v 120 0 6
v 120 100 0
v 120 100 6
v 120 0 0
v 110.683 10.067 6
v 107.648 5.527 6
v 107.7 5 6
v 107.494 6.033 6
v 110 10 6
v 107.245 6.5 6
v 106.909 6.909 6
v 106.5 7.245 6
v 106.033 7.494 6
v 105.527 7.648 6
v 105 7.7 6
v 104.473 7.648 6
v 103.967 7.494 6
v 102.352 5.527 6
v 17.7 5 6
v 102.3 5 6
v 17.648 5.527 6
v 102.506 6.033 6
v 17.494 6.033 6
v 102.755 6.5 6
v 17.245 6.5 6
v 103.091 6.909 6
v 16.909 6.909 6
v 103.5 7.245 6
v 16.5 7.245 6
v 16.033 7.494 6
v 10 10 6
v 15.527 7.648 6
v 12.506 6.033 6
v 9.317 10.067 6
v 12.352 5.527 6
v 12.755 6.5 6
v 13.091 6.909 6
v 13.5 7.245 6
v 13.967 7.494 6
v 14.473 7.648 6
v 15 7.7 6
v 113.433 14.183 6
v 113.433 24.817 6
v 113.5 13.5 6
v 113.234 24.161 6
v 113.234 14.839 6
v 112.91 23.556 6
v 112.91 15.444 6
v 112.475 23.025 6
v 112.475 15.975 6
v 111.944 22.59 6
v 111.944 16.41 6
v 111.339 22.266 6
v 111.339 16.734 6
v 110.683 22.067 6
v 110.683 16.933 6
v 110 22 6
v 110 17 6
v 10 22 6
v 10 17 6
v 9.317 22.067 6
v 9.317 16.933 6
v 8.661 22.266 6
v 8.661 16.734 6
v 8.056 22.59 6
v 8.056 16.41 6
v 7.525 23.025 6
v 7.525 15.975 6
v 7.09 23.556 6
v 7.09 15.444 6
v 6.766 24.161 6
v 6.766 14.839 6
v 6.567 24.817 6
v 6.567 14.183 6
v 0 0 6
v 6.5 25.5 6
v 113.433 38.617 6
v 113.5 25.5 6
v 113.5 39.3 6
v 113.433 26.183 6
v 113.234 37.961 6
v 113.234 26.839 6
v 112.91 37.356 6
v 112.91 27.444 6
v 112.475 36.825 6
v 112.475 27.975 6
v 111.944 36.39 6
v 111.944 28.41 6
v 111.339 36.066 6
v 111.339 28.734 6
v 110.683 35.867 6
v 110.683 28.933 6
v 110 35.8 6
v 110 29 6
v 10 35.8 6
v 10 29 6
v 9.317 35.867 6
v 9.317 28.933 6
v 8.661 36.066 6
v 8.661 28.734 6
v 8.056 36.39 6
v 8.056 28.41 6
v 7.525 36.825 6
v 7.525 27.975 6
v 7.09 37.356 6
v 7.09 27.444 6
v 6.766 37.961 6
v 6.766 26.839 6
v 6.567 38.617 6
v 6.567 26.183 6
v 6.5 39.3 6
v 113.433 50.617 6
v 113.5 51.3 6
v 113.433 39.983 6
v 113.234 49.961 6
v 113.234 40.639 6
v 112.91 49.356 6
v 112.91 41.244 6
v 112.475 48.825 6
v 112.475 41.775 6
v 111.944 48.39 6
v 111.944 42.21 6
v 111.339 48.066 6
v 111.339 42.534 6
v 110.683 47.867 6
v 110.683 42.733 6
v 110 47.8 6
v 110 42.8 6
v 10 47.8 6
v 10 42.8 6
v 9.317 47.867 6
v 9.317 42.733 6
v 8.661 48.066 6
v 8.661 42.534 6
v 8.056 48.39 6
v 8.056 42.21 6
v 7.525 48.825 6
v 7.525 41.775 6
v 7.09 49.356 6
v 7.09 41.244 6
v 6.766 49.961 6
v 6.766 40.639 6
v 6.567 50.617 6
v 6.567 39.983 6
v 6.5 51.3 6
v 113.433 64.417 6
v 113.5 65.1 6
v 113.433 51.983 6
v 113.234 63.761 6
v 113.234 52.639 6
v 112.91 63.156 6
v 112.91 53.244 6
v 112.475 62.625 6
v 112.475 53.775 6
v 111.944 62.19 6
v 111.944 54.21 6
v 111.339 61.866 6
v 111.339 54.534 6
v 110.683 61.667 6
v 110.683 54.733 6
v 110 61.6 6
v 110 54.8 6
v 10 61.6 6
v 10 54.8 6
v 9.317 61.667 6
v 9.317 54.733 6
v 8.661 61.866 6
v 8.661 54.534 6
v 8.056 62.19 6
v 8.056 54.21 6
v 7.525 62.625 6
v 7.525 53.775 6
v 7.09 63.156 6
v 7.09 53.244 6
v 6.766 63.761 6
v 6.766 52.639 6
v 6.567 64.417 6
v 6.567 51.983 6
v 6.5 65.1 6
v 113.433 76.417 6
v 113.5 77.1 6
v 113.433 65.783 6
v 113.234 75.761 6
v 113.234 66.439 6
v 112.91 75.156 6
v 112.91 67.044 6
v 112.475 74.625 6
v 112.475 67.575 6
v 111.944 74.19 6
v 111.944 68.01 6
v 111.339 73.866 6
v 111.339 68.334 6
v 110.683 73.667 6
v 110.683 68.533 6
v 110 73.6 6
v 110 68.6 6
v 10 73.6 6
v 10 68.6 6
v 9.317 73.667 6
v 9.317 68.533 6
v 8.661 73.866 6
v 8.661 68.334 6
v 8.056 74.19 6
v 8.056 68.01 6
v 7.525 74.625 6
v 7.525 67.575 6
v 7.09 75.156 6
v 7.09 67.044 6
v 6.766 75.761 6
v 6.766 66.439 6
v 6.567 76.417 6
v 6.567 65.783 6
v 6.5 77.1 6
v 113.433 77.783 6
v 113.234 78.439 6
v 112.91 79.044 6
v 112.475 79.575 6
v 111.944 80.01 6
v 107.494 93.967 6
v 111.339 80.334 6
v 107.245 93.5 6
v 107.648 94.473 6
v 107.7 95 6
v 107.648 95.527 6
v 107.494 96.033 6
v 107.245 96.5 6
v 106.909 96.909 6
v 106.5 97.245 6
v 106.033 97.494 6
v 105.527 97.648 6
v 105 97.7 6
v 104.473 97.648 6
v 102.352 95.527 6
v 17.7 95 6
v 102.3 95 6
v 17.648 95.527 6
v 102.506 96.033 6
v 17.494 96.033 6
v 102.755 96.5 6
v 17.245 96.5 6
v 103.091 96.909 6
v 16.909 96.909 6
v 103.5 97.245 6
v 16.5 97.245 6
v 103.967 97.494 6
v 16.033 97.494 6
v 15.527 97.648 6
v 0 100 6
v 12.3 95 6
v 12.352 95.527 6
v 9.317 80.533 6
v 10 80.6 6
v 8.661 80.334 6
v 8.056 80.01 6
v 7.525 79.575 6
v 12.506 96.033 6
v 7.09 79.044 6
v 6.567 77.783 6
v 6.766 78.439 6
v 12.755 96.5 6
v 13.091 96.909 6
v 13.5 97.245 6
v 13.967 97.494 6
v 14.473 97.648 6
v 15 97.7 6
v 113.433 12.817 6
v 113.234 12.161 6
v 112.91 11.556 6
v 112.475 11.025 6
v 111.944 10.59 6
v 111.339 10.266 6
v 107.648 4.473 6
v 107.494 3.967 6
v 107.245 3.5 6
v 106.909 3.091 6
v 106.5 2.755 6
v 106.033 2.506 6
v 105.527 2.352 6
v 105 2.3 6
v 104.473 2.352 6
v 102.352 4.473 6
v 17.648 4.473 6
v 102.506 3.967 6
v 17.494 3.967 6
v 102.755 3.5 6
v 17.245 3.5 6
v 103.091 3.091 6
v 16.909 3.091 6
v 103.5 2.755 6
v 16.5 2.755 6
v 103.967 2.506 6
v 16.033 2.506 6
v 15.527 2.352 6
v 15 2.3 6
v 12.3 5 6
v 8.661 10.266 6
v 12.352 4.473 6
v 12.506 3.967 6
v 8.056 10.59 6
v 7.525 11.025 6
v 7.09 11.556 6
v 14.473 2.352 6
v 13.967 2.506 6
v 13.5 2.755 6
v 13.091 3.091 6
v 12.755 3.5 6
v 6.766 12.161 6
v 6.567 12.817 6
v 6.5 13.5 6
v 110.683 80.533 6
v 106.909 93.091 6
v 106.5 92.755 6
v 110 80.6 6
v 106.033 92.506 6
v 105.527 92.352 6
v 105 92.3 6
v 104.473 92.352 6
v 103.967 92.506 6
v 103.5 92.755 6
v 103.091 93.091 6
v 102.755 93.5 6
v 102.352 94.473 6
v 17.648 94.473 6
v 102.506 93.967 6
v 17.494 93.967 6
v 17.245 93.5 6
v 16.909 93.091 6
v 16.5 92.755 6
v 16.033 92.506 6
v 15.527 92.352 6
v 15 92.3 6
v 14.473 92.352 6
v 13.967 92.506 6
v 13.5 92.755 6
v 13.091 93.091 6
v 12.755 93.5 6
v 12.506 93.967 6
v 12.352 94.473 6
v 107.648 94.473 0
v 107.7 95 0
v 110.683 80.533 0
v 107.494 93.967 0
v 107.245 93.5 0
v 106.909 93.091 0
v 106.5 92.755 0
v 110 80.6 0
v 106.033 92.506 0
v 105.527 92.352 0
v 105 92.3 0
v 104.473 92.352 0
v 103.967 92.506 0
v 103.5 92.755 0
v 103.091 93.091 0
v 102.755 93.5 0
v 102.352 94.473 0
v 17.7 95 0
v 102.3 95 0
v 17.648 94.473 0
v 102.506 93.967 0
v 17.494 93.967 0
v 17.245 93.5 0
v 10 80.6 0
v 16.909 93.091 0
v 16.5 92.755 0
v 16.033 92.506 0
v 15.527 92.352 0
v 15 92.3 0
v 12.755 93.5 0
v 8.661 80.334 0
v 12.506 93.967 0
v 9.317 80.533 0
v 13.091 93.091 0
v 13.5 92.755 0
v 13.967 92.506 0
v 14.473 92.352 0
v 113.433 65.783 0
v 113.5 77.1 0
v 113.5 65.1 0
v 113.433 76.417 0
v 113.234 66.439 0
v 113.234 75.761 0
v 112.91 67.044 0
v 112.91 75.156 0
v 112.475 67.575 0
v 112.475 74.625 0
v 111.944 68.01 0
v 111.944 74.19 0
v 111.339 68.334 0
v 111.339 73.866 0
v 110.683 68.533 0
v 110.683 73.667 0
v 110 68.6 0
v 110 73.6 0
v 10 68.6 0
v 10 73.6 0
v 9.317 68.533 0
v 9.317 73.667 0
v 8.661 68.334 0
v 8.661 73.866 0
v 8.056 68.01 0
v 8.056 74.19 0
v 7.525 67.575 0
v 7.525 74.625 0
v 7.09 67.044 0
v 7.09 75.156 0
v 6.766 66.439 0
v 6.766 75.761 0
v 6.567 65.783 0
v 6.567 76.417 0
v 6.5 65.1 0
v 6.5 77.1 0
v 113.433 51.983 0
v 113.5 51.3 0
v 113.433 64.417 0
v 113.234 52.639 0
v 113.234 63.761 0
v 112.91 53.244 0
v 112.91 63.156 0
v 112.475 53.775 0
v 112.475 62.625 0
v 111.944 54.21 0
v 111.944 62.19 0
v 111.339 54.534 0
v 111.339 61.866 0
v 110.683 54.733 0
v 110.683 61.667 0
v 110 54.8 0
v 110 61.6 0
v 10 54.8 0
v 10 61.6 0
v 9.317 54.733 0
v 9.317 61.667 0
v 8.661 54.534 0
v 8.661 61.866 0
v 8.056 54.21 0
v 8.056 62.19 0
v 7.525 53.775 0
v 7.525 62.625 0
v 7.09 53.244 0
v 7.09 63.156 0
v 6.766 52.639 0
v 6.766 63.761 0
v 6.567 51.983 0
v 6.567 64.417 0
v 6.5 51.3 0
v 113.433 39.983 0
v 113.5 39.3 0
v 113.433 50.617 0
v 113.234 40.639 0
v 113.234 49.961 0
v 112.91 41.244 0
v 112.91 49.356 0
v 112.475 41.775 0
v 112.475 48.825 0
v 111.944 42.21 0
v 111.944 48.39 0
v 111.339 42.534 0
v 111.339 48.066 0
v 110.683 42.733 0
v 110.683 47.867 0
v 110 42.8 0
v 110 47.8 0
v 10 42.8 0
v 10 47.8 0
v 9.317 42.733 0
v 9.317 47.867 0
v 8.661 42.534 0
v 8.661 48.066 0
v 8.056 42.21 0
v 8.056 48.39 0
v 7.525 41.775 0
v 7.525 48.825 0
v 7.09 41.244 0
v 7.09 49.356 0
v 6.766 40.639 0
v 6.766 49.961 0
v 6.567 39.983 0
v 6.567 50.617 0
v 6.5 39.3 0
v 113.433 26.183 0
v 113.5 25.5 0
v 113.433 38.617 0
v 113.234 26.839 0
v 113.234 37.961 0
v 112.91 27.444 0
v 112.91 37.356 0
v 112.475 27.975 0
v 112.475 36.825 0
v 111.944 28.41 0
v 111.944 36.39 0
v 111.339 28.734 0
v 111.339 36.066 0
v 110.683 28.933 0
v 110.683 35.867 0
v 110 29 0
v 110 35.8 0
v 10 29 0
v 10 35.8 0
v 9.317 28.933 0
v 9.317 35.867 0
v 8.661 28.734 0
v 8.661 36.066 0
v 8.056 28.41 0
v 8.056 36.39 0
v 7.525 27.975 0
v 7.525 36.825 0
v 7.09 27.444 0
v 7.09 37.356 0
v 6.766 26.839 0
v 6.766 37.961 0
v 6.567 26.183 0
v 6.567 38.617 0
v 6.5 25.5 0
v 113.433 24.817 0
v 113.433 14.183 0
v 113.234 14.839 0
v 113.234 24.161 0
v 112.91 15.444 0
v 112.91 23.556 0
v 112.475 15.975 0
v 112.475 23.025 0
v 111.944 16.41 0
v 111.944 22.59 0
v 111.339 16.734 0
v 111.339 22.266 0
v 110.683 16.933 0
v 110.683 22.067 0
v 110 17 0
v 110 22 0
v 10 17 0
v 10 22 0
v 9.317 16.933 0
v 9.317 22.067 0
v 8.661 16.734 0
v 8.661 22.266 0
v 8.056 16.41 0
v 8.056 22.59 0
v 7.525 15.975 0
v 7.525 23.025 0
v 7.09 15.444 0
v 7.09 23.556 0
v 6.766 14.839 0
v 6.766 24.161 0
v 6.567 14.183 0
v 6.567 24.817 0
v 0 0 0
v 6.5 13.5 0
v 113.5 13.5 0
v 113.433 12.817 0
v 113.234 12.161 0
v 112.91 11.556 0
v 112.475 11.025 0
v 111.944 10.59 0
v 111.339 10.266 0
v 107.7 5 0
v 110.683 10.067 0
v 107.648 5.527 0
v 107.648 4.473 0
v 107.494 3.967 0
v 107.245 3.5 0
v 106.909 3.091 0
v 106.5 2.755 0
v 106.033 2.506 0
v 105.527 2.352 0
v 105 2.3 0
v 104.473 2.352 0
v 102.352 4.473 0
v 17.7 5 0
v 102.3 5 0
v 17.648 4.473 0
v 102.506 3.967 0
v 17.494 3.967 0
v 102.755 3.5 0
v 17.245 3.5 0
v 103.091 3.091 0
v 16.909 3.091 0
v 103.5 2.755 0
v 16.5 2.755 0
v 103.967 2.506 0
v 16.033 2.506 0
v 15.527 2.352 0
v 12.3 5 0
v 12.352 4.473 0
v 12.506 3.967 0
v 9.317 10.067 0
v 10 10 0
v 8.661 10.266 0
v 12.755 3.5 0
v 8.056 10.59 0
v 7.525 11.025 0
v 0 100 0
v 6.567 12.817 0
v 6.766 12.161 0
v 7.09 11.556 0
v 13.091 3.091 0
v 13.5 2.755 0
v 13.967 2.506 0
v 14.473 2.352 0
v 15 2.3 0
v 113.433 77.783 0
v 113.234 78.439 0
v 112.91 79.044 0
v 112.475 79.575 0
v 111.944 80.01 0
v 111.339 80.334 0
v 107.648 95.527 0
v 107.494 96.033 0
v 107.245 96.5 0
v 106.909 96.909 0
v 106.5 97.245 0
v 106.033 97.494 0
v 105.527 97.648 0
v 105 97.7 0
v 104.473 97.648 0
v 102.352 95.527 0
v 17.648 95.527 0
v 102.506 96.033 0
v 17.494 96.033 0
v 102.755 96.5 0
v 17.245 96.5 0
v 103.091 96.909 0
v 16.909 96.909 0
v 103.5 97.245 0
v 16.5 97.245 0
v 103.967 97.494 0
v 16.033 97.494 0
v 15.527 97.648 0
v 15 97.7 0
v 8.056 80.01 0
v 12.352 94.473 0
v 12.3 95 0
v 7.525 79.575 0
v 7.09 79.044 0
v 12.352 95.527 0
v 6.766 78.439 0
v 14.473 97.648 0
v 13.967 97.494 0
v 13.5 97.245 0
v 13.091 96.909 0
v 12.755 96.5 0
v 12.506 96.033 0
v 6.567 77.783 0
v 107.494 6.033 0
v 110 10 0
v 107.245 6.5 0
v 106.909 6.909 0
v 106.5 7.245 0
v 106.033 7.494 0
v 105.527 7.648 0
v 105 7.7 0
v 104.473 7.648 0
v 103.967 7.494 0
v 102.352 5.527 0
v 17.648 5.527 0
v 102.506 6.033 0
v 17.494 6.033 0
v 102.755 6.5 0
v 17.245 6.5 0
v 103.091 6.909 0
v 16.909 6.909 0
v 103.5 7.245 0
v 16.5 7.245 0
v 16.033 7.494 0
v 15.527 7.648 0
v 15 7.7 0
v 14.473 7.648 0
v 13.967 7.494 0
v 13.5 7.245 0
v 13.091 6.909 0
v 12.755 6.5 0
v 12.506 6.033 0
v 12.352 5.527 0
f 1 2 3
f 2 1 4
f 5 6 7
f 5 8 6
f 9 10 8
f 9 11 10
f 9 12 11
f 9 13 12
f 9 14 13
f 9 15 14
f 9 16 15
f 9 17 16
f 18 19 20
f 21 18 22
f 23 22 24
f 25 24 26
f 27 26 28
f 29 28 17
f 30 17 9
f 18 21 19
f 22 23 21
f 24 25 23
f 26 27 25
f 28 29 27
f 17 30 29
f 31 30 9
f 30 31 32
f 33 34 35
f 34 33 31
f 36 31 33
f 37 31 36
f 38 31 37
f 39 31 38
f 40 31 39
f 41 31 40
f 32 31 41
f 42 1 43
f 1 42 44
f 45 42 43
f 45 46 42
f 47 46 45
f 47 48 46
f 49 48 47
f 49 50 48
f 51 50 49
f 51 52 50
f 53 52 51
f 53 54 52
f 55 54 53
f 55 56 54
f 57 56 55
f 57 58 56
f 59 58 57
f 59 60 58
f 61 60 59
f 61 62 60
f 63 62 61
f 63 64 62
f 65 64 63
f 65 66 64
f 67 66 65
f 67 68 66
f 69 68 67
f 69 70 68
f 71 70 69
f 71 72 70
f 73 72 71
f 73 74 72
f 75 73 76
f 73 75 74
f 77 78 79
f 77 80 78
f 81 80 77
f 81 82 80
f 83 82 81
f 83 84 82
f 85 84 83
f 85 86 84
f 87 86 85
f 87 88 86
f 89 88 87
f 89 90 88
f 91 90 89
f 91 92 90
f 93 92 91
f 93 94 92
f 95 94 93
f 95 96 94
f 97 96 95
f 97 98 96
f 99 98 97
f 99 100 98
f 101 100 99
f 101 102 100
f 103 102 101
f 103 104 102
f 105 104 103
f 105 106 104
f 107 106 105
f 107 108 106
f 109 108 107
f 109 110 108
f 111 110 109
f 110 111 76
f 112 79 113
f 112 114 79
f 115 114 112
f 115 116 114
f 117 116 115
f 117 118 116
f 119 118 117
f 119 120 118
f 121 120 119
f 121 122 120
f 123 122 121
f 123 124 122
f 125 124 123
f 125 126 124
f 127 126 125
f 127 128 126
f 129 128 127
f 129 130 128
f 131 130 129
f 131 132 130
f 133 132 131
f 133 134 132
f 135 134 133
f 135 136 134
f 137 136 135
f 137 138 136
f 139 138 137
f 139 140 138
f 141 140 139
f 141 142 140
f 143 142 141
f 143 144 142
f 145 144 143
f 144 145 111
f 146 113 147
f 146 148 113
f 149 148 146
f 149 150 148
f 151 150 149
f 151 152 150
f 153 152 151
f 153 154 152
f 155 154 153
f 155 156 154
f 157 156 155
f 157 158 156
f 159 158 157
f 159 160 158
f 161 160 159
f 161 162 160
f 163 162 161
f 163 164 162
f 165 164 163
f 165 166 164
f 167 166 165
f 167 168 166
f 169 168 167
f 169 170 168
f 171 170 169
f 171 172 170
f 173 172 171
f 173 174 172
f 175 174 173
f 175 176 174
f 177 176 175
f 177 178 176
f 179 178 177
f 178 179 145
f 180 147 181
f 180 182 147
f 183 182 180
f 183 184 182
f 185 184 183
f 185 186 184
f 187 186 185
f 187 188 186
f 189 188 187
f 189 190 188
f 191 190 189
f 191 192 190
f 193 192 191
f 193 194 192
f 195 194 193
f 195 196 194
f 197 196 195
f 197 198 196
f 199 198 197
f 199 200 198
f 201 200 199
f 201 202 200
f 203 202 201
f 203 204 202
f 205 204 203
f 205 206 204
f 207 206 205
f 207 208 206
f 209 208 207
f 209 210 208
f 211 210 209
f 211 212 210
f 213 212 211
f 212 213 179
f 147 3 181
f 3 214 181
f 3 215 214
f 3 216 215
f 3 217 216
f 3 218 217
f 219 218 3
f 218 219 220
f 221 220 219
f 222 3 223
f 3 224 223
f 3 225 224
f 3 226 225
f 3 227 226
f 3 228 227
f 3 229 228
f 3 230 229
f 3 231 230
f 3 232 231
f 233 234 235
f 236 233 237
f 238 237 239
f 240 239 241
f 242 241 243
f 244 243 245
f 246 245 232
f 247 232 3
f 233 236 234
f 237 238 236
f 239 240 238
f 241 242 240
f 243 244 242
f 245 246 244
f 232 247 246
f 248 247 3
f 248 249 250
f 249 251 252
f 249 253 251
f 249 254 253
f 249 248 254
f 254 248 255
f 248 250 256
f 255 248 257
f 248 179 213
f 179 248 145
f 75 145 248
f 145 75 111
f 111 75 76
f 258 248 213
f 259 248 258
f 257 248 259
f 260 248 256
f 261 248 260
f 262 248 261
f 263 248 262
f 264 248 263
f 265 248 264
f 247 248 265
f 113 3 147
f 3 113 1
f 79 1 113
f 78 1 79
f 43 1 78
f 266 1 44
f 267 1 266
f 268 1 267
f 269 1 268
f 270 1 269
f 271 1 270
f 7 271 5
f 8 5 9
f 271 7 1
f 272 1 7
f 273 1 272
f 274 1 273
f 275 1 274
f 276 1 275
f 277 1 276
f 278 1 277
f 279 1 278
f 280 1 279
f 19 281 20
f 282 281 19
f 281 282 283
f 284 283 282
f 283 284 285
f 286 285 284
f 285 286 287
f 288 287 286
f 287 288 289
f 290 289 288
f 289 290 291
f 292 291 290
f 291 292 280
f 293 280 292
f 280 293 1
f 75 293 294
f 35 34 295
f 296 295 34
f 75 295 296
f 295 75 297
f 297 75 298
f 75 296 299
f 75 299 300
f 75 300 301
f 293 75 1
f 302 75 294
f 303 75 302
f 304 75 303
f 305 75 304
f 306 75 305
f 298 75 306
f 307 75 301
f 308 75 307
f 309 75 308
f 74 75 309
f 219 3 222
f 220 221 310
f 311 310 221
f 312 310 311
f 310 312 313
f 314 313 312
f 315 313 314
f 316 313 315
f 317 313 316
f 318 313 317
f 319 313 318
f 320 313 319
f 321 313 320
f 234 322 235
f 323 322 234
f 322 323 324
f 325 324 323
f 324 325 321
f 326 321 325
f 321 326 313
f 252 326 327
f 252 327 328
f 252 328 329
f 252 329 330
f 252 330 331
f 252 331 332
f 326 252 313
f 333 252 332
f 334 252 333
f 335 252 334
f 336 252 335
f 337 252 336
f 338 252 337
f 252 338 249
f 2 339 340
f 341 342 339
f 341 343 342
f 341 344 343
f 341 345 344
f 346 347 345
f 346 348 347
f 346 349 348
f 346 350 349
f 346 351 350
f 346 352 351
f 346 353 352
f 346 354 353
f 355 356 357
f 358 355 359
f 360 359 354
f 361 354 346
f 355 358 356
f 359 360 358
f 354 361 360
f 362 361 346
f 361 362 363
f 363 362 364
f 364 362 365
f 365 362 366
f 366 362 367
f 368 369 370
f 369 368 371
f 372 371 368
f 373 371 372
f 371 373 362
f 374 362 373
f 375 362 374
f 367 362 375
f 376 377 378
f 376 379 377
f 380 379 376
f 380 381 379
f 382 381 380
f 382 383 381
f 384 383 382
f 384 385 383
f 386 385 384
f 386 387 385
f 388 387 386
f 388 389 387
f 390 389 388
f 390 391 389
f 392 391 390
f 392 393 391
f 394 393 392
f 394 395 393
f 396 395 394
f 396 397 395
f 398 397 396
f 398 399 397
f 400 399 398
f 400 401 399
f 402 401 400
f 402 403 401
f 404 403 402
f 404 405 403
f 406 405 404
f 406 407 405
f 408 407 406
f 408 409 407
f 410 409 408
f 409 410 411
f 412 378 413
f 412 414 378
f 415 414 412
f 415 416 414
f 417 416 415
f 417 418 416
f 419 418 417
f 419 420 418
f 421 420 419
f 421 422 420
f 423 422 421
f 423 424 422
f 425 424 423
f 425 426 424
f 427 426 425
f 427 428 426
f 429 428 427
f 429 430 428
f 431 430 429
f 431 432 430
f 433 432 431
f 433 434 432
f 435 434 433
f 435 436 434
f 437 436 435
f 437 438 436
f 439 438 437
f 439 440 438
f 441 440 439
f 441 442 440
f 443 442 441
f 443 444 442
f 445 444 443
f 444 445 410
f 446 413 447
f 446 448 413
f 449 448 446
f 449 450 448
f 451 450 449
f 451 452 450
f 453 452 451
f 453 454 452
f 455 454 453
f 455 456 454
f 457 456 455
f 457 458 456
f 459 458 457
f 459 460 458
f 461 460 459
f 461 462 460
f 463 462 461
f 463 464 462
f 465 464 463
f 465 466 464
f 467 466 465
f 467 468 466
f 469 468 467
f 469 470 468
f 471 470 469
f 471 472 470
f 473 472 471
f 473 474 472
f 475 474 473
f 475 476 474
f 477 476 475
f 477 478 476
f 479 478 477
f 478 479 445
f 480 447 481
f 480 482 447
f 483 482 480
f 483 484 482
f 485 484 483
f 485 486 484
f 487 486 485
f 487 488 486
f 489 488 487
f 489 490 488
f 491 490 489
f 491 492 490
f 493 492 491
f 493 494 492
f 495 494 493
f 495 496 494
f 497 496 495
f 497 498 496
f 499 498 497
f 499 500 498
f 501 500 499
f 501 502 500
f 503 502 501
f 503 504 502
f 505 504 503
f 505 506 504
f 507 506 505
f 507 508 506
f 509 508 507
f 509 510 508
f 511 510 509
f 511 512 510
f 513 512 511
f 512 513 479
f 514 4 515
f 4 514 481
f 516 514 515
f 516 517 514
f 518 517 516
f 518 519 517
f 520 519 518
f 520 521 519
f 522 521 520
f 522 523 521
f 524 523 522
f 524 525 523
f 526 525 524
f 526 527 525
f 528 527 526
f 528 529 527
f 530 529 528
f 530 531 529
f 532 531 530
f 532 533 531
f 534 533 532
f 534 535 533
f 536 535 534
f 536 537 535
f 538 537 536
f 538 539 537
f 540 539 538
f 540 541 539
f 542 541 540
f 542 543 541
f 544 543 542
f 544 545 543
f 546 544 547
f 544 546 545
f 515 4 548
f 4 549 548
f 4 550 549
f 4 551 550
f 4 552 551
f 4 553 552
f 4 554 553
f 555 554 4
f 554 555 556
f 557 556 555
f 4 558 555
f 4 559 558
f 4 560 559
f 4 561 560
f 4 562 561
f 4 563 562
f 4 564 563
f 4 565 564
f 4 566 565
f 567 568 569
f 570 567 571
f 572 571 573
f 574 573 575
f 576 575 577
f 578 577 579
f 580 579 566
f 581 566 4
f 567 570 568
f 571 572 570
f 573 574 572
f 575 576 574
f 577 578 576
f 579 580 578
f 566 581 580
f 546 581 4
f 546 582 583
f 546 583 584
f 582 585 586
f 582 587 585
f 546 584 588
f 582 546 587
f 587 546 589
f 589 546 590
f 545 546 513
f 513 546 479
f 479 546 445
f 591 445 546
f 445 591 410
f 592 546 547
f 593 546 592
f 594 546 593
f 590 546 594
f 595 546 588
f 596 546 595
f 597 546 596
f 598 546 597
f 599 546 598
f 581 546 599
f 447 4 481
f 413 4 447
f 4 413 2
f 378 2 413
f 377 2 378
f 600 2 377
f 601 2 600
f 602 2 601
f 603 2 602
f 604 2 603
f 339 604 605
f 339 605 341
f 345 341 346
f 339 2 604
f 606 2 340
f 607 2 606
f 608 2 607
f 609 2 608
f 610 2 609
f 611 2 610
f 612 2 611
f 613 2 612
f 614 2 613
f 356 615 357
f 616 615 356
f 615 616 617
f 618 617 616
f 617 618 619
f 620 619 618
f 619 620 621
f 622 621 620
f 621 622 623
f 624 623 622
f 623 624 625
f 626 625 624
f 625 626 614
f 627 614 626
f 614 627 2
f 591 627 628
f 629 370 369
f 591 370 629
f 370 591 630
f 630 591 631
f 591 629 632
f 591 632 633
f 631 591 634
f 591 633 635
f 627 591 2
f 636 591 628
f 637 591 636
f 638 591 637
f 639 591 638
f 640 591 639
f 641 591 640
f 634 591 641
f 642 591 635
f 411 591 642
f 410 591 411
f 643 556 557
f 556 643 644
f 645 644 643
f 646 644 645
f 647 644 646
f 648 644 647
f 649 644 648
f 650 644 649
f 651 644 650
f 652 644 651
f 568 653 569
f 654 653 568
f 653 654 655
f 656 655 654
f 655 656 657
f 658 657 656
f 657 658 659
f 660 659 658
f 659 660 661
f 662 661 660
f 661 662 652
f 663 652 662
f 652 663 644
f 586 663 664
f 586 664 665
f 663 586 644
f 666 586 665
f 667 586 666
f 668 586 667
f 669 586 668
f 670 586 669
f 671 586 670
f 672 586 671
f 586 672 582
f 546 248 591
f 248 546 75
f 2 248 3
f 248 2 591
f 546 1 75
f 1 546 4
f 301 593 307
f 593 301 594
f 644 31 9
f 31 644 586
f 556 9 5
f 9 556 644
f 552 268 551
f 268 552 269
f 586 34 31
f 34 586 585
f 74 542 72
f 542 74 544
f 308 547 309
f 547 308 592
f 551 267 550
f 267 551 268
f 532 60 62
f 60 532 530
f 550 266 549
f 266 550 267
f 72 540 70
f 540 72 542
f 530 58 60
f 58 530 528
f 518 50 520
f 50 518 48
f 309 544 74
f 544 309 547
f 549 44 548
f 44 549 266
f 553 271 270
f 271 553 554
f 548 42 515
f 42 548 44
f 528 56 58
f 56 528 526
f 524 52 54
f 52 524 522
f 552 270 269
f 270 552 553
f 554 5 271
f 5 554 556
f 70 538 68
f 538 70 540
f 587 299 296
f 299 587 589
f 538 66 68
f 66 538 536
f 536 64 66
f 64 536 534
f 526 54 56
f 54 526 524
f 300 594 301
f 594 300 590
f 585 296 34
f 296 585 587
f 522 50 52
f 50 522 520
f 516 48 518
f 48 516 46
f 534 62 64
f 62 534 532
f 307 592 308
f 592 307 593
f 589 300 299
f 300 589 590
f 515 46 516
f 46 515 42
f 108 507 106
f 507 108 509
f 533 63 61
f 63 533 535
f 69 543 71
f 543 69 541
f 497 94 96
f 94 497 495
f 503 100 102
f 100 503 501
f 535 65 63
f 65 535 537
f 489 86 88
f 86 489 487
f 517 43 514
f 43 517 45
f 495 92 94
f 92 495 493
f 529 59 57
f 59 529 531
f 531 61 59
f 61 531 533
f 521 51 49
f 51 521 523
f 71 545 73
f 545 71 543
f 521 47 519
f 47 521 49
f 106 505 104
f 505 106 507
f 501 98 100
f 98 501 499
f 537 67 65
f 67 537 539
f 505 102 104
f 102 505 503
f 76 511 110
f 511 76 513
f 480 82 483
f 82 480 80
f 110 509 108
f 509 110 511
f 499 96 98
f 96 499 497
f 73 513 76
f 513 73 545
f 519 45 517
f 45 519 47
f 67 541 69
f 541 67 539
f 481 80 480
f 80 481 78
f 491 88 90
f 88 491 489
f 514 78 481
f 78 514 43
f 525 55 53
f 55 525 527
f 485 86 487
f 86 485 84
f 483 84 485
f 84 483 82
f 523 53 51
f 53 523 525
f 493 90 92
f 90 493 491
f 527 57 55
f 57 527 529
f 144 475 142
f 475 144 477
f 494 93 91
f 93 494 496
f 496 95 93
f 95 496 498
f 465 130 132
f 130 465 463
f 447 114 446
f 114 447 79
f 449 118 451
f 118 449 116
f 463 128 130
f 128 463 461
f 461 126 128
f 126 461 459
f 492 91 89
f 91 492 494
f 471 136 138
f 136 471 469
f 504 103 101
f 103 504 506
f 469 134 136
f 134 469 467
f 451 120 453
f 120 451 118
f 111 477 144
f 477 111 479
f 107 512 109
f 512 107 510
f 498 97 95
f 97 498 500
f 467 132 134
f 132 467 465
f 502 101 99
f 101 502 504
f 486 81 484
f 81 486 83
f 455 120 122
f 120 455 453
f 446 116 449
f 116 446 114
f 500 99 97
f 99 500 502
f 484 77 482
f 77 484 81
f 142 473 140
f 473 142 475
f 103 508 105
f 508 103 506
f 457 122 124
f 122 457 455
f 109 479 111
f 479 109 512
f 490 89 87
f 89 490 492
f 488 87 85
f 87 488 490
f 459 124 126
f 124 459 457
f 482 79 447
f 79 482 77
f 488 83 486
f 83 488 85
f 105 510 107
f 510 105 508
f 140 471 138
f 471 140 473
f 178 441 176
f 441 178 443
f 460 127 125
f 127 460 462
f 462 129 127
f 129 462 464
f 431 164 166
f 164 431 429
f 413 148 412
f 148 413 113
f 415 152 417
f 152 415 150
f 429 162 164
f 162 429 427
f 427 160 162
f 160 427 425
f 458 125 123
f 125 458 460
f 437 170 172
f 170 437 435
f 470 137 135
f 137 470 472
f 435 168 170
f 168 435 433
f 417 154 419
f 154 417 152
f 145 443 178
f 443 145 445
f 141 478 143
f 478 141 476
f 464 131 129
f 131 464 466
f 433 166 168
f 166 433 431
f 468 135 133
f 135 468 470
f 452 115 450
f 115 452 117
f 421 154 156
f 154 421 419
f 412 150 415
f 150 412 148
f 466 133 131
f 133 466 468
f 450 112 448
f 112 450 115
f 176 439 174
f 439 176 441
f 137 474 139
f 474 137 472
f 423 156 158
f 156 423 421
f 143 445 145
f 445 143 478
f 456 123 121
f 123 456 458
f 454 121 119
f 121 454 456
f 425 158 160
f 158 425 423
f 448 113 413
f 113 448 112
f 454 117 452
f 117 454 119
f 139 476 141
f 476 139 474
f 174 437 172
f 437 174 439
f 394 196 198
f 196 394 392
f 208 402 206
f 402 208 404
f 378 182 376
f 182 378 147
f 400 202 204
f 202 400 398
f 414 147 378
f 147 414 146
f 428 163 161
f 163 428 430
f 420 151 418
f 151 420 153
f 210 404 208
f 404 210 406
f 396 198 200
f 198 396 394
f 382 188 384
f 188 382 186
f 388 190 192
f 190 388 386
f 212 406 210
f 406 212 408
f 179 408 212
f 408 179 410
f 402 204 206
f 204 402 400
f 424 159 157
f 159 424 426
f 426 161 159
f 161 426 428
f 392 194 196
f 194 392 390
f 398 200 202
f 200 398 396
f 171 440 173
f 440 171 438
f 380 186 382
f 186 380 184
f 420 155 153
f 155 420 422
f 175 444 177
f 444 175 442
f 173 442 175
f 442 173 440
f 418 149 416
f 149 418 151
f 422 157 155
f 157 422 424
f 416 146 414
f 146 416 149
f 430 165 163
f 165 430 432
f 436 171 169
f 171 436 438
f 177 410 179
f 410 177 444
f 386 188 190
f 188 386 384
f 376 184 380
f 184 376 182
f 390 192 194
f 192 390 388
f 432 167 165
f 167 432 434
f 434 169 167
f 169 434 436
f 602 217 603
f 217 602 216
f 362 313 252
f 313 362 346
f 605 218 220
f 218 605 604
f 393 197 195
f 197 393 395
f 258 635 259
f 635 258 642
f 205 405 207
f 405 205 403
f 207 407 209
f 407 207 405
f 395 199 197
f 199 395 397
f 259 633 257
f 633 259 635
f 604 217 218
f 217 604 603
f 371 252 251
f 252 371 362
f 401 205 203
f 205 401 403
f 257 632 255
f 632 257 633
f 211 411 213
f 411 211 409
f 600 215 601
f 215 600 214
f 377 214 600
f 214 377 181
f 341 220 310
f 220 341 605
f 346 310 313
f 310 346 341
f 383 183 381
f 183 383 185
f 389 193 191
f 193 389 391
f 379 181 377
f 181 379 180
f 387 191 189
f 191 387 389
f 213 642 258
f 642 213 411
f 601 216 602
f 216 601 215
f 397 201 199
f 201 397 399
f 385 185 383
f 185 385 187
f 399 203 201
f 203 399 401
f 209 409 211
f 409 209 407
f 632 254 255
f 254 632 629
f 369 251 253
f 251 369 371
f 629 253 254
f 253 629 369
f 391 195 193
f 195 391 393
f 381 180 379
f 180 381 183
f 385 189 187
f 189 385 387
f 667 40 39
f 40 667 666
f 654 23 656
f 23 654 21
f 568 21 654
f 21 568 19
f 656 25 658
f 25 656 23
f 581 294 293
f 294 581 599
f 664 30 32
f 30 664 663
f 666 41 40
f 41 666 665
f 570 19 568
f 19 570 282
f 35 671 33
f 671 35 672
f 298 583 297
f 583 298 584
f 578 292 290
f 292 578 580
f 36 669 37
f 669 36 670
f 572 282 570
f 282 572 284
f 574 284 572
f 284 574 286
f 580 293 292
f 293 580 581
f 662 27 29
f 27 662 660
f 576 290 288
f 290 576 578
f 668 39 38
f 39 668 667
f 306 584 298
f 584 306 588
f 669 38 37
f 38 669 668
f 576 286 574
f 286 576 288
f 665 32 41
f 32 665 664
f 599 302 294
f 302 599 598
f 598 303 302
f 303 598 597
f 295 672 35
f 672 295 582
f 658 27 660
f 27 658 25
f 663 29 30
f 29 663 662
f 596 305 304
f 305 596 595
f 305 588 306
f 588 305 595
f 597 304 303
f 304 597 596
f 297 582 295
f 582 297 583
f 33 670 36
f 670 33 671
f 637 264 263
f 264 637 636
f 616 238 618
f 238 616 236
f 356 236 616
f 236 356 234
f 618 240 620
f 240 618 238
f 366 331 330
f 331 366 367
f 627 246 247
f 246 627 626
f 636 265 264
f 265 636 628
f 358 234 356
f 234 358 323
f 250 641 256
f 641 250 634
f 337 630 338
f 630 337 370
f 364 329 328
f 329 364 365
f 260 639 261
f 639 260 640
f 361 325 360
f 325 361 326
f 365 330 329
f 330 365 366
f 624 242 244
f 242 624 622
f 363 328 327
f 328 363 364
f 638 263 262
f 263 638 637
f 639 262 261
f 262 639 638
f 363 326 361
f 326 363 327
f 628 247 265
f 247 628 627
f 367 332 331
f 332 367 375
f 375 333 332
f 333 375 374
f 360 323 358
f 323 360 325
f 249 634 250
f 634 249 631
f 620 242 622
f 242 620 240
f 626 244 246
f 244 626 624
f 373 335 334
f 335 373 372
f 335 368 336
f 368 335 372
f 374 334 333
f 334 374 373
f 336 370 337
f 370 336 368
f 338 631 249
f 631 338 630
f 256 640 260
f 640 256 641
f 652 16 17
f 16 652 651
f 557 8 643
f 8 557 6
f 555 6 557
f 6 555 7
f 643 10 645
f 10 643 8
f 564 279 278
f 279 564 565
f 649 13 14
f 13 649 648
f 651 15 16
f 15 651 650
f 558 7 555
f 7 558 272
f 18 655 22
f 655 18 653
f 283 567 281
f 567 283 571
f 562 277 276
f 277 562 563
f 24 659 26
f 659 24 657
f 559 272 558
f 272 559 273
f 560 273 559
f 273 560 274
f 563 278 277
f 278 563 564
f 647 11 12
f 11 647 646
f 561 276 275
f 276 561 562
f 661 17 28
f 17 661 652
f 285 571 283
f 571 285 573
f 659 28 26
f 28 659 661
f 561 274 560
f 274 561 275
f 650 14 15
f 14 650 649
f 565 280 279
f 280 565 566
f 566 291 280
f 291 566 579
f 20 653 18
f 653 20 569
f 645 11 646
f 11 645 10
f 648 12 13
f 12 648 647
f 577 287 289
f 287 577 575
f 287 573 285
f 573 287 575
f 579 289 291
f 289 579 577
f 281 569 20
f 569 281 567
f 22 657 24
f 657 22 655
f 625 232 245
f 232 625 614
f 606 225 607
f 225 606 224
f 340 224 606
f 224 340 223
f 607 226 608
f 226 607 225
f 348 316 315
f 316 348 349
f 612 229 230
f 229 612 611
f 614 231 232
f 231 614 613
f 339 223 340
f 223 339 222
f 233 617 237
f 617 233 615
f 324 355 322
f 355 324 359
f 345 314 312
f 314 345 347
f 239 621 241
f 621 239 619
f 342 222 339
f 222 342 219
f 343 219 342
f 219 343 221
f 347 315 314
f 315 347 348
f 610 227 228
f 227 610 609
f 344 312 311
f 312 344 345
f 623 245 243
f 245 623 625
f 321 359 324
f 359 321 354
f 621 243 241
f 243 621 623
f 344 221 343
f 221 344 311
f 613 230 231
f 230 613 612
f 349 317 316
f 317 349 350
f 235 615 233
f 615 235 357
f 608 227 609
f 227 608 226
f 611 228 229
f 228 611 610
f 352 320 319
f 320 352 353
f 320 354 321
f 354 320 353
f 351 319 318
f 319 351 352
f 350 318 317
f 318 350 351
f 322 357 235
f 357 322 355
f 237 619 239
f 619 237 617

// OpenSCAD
$fn = 32;

// ----------------------------------------------------------------------
// Slotted panel: 120 x 100 mm, 6 рядов of slots
// ----------------------------------------------------------------------

// --- parameters (mm) ---
panel_w = 120;            // panel width
panel_d = 100;            // panel depth
thick = 6;                // panel thickness
slot_w = 7;               // slot width
pitch0 = 12;              // first row pitch
pitch_step = 1.8;         // pitch increase per row
margin = 10;              // margin around the slot field
rows = 6;                 // number of slot rows
mount_d = 5.4;            // mounting holes
mount_x = 45;             // mounting hole offset

difference() {
  union() {
    cube([panel_w, panel_d, thick]);
  }
  /* slot rows: stadium shaped cutters, 2.5 mm clear of both faces */
  /* row 0: pitch 12, length 100 */
  hull() {
    translate([10, 13.5, -2.5]) cylinder(h = thick + 5, d = slot_w);
    translate([110, 13.5, -2.5]) cylinder(h = thick + 5, d = slot_w);
  }
  /* row 1: pitch 13.8, length 100 */
  hull() {
    translate([10, 25.5, -2.5]) cylinder(h = thick + 5, d = slot_w);
    translate([110, 25.5, -2.5]) cylinder(h = thick + 5, d = slot_w);
  }
  /* row 2: pitch 12, length 100 */
  hull() {
    translate([10, 39.3, -2.5]) cylinder(h = thick + 5, d = slot_w);
    translate([110, 39.3, -2.5]) cylinder(h = thick + 5, d = slot_w);
  }
  /* row 3: pitch 13.8, length 100 */
  hull() {
    translate([10, 51.3, -2.5]) cylinder(h = thick + 5, d = slot_w);
    translate([110, 51.3, -2.5]) cylinder(h = thick + 5, d = slot_w);
  }
  /* row 4: pitch 12, length 100 */
  hull() {
    translate([10, 65.1, -2.5]) cylinder(h = thick + 5, d = slot_w);
    translate([110, 65.1, -2.5]) cylinder(h = thick + 5, d = slot_w);
  }
  /* row 5: pitch 13.8, length 100 */
  hull() {
    translate([10, 77.1, -2.5]) cylinder(h = thick + 5, d = slot_w);
    translate([110, 77.1, -2.5]) cylinder(h = thick + 5, d = slot_w);
  }
  translate([15, 5, -2.5]) cylinder(h = 11, d = mount_d);
  translate([15, 95, -2.5]) cylinder(h = 11, d = mount_d);
  translate([105, 5, -2.5]) cylinder(h = 11, d = mount_d);
  translate([105, 95, -2.5]) cylinder(h = 11, d = mount_d);
}
